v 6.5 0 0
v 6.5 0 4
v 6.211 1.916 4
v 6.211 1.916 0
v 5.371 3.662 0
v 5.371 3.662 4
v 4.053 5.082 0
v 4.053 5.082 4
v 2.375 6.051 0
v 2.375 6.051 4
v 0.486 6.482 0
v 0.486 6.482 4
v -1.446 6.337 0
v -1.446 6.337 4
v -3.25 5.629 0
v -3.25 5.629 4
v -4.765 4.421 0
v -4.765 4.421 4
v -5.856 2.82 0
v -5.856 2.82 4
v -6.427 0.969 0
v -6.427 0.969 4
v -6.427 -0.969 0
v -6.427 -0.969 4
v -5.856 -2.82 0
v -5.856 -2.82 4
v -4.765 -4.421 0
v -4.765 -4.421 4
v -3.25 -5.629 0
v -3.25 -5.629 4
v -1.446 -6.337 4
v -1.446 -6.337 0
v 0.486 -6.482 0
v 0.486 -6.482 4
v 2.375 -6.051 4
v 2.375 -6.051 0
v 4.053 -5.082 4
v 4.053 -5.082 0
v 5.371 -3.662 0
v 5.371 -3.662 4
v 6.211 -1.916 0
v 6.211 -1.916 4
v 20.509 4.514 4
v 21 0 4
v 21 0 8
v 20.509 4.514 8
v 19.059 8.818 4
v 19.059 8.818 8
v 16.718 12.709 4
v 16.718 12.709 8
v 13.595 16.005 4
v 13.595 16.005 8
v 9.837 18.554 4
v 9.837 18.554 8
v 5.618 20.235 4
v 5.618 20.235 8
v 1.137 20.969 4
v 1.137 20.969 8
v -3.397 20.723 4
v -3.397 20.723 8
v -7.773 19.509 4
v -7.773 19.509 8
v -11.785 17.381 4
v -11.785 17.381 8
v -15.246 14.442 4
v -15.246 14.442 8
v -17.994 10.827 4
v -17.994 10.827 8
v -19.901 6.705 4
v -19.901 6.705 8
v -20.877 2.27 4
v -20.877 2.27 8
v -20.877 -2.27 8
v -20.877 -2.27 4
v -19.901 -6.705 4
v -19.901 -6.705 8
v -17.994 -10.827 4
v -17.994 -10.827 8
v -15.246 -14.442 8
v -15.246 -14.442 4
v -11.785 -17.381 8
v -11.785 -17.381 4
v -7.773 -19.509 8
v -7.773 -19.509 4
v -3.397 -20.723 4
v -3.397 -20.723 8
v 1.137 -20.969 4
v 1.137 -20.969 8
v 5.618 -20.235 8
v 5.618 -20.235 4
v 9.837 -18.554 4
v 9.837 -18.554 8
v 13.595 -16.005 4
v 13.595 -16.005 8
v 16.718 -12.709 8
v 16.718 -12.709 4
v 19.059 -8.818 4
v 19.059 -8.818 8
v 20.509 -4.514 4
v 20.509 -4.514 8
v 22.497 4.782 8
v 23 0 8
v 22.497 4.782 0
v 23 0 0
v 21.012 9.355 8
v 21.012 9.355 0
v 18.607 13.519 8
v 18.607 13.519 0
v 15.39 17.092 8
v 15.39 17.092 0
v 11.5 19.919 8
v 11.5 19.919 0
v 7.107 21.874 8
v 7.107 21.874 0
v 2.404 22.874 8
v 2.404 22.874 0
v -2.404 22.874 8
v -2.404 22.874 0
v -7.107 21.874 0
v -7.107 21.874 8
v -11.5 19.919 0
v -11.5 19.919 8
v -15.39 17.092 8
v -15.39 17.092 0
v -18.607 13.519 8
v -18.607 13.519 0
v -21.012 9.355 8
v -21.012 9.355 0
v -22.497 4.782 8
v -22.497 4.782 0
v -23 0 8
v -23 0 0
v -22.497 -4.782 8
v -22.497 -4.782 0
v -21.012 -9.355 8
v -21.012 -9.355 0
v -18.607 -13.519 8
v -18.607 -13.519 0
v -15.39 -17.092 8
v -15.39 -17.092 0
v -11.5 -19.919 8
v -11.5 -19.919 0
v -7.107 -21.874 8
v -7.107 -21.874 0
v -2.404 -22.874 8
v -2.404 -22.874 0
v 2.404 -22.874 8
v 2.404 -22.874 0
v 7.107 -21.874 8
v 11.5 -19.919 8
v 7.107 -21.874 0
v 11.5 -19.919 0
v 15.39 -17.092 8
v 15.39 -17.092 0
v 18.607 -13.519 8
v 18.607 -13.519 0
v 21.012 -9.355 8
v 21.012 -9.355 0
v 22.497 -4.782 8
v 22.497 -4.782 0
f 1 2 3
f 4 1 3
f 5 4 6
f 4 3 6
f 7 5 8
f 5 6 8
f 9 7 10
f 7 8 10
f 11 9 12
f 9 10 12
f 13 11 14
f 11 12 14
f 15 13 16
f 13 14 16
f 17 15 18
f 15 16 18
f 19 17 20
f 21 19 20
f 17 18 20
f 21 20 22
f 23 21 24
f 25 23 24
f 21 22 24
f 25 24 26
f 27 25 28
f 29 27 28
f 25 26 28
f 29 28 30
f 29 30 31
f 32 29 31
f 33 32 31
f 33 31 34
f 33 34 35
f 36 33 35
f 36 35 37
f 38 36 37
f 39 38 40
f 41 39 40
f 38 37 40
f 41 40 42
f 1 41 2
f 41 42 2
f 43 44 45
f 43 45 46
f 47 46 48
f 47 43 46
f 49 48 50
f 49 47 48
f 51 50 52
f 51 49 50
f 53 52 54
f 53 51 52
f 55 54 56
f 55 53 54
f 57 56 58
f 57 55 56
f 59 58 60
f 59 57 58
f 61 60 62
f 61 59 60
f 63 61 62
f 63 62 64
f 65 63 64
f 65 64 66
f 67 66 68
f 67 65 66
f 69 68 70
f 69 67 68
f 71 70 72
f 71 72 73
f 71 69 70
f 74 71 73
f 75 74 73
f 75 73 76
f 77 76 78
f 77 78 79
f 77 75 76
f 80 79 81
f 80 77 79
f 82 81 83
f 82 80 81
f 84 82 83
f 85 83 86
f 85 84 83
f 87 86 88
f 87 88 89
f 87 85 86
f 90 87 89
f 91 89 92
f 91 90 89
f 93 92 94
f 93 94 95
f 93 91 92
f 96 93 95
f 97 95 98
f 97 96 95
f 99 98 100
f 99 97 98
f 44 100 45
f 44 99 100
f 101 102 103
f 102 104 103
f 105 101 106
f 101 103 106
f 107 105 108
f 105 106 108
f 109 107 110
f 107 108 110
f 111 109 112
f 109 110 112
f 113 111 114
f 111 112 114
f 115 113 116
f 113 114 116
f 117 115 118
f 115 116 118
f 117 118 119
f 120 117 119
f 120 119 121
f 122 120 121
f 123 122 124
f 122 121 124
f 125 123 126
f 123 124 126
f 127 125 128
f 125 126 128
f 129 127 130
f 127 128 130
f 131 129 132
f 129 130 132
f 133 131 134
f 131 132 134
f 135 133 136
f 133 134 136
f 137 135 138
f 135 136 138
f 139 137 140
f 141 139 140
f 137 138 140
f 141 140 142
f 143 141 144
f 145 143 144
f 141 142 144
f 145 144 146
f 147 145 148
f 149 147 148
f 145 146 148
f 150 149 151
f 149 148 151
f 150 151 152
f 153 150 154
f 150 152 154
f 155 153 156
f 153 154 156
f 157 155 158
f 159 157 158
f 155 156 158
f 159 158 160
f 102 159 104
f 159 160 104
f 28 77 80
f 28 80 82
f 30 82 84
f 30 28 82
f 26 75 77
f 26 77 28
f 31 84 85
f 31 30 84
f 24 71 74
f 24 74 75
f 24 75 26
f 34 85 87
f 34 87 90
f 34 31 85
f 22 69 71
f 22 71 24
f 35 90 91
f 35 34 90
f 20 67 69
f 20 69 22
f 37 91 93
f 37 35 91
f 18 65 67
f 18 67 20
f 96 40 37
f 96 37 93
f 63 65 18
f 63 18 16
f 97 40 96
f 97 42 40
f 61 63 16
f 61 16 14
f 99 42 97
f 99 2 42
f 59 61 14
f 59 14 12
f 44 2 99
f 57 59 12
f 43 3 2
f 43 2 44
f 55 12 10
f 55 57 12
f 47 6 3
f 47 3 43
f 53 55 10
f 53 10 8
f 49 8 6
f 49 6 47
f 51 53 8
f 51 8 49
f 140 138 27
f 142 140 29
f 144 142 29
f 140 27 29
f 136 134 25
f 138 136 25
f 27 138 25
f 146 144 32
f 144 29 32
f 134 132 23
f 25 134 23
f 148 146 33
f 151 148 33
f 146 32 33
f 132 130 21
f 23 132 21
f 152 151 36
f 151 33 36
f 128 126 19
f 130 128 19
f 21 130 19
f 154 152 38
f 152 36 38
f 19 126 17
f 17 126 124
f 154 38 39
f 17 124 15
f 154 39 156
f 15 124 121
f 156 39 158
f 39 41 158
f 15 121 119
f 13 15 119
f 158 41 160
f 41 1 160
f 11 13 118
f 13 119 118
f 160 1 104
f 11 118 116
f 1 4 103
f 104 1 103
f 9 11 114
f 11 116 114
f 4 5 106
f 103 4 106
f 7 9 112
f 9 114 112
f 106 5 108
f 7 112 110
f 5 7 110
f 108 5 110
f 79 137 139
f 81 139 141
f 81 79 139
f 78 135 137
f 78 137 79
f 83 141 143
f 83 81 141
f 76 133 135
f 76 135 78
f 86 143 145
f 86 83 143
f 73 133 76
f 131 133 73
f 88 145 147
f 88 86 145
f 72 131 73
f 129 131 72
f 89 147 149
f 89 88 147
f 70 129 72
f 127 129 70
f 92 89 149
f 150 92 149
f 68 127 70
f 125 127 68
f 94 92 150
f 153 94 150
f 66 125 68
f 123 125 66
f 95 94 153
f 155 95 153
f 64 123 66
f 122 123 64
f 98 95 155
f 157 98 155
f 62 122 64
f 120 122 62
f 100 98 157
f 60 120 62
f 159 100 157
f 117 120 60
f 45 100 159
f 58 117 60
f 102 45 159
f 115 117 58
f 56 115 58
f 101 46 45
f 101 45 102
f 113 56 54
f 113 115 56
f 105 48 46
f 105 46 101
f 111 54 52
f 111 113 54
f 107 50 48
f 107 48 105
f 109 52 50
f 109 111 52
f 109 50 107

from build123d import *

# Parameters (mm, degrees)
F0_R     = 23
F1_DEPTH = 4
F2_R     = 23
F2_R_2   = 21
F3_DEPTH = 4
F4_R     = 6.5
F5_DEPTH = 4


with BuildPart() as f1:
    # F0 (on Top) → F1 (new body)
    with BuildSketch(Plane.XY):
        Circle(F0_R)
    extrude(amount=F1_DEPTH)

    # F2 (on face) → F3 (join)
    with BuildSketch(Plane.XY.offset(4)):
        Circle(F2_R)
        Circle(F2_R_2, mode=Mode.SUBTRACT)
    extrude(amount=F3_DEPTH)

    # F4 (on face) → F5 (cut, through all)
    with BuildSketch(Plane.XY.offset(4)):
        Circle(F4_R)
    extrude(amount=-F5_DEPTH, mode=Mode.SUBTRACT)


solid = f1.part
